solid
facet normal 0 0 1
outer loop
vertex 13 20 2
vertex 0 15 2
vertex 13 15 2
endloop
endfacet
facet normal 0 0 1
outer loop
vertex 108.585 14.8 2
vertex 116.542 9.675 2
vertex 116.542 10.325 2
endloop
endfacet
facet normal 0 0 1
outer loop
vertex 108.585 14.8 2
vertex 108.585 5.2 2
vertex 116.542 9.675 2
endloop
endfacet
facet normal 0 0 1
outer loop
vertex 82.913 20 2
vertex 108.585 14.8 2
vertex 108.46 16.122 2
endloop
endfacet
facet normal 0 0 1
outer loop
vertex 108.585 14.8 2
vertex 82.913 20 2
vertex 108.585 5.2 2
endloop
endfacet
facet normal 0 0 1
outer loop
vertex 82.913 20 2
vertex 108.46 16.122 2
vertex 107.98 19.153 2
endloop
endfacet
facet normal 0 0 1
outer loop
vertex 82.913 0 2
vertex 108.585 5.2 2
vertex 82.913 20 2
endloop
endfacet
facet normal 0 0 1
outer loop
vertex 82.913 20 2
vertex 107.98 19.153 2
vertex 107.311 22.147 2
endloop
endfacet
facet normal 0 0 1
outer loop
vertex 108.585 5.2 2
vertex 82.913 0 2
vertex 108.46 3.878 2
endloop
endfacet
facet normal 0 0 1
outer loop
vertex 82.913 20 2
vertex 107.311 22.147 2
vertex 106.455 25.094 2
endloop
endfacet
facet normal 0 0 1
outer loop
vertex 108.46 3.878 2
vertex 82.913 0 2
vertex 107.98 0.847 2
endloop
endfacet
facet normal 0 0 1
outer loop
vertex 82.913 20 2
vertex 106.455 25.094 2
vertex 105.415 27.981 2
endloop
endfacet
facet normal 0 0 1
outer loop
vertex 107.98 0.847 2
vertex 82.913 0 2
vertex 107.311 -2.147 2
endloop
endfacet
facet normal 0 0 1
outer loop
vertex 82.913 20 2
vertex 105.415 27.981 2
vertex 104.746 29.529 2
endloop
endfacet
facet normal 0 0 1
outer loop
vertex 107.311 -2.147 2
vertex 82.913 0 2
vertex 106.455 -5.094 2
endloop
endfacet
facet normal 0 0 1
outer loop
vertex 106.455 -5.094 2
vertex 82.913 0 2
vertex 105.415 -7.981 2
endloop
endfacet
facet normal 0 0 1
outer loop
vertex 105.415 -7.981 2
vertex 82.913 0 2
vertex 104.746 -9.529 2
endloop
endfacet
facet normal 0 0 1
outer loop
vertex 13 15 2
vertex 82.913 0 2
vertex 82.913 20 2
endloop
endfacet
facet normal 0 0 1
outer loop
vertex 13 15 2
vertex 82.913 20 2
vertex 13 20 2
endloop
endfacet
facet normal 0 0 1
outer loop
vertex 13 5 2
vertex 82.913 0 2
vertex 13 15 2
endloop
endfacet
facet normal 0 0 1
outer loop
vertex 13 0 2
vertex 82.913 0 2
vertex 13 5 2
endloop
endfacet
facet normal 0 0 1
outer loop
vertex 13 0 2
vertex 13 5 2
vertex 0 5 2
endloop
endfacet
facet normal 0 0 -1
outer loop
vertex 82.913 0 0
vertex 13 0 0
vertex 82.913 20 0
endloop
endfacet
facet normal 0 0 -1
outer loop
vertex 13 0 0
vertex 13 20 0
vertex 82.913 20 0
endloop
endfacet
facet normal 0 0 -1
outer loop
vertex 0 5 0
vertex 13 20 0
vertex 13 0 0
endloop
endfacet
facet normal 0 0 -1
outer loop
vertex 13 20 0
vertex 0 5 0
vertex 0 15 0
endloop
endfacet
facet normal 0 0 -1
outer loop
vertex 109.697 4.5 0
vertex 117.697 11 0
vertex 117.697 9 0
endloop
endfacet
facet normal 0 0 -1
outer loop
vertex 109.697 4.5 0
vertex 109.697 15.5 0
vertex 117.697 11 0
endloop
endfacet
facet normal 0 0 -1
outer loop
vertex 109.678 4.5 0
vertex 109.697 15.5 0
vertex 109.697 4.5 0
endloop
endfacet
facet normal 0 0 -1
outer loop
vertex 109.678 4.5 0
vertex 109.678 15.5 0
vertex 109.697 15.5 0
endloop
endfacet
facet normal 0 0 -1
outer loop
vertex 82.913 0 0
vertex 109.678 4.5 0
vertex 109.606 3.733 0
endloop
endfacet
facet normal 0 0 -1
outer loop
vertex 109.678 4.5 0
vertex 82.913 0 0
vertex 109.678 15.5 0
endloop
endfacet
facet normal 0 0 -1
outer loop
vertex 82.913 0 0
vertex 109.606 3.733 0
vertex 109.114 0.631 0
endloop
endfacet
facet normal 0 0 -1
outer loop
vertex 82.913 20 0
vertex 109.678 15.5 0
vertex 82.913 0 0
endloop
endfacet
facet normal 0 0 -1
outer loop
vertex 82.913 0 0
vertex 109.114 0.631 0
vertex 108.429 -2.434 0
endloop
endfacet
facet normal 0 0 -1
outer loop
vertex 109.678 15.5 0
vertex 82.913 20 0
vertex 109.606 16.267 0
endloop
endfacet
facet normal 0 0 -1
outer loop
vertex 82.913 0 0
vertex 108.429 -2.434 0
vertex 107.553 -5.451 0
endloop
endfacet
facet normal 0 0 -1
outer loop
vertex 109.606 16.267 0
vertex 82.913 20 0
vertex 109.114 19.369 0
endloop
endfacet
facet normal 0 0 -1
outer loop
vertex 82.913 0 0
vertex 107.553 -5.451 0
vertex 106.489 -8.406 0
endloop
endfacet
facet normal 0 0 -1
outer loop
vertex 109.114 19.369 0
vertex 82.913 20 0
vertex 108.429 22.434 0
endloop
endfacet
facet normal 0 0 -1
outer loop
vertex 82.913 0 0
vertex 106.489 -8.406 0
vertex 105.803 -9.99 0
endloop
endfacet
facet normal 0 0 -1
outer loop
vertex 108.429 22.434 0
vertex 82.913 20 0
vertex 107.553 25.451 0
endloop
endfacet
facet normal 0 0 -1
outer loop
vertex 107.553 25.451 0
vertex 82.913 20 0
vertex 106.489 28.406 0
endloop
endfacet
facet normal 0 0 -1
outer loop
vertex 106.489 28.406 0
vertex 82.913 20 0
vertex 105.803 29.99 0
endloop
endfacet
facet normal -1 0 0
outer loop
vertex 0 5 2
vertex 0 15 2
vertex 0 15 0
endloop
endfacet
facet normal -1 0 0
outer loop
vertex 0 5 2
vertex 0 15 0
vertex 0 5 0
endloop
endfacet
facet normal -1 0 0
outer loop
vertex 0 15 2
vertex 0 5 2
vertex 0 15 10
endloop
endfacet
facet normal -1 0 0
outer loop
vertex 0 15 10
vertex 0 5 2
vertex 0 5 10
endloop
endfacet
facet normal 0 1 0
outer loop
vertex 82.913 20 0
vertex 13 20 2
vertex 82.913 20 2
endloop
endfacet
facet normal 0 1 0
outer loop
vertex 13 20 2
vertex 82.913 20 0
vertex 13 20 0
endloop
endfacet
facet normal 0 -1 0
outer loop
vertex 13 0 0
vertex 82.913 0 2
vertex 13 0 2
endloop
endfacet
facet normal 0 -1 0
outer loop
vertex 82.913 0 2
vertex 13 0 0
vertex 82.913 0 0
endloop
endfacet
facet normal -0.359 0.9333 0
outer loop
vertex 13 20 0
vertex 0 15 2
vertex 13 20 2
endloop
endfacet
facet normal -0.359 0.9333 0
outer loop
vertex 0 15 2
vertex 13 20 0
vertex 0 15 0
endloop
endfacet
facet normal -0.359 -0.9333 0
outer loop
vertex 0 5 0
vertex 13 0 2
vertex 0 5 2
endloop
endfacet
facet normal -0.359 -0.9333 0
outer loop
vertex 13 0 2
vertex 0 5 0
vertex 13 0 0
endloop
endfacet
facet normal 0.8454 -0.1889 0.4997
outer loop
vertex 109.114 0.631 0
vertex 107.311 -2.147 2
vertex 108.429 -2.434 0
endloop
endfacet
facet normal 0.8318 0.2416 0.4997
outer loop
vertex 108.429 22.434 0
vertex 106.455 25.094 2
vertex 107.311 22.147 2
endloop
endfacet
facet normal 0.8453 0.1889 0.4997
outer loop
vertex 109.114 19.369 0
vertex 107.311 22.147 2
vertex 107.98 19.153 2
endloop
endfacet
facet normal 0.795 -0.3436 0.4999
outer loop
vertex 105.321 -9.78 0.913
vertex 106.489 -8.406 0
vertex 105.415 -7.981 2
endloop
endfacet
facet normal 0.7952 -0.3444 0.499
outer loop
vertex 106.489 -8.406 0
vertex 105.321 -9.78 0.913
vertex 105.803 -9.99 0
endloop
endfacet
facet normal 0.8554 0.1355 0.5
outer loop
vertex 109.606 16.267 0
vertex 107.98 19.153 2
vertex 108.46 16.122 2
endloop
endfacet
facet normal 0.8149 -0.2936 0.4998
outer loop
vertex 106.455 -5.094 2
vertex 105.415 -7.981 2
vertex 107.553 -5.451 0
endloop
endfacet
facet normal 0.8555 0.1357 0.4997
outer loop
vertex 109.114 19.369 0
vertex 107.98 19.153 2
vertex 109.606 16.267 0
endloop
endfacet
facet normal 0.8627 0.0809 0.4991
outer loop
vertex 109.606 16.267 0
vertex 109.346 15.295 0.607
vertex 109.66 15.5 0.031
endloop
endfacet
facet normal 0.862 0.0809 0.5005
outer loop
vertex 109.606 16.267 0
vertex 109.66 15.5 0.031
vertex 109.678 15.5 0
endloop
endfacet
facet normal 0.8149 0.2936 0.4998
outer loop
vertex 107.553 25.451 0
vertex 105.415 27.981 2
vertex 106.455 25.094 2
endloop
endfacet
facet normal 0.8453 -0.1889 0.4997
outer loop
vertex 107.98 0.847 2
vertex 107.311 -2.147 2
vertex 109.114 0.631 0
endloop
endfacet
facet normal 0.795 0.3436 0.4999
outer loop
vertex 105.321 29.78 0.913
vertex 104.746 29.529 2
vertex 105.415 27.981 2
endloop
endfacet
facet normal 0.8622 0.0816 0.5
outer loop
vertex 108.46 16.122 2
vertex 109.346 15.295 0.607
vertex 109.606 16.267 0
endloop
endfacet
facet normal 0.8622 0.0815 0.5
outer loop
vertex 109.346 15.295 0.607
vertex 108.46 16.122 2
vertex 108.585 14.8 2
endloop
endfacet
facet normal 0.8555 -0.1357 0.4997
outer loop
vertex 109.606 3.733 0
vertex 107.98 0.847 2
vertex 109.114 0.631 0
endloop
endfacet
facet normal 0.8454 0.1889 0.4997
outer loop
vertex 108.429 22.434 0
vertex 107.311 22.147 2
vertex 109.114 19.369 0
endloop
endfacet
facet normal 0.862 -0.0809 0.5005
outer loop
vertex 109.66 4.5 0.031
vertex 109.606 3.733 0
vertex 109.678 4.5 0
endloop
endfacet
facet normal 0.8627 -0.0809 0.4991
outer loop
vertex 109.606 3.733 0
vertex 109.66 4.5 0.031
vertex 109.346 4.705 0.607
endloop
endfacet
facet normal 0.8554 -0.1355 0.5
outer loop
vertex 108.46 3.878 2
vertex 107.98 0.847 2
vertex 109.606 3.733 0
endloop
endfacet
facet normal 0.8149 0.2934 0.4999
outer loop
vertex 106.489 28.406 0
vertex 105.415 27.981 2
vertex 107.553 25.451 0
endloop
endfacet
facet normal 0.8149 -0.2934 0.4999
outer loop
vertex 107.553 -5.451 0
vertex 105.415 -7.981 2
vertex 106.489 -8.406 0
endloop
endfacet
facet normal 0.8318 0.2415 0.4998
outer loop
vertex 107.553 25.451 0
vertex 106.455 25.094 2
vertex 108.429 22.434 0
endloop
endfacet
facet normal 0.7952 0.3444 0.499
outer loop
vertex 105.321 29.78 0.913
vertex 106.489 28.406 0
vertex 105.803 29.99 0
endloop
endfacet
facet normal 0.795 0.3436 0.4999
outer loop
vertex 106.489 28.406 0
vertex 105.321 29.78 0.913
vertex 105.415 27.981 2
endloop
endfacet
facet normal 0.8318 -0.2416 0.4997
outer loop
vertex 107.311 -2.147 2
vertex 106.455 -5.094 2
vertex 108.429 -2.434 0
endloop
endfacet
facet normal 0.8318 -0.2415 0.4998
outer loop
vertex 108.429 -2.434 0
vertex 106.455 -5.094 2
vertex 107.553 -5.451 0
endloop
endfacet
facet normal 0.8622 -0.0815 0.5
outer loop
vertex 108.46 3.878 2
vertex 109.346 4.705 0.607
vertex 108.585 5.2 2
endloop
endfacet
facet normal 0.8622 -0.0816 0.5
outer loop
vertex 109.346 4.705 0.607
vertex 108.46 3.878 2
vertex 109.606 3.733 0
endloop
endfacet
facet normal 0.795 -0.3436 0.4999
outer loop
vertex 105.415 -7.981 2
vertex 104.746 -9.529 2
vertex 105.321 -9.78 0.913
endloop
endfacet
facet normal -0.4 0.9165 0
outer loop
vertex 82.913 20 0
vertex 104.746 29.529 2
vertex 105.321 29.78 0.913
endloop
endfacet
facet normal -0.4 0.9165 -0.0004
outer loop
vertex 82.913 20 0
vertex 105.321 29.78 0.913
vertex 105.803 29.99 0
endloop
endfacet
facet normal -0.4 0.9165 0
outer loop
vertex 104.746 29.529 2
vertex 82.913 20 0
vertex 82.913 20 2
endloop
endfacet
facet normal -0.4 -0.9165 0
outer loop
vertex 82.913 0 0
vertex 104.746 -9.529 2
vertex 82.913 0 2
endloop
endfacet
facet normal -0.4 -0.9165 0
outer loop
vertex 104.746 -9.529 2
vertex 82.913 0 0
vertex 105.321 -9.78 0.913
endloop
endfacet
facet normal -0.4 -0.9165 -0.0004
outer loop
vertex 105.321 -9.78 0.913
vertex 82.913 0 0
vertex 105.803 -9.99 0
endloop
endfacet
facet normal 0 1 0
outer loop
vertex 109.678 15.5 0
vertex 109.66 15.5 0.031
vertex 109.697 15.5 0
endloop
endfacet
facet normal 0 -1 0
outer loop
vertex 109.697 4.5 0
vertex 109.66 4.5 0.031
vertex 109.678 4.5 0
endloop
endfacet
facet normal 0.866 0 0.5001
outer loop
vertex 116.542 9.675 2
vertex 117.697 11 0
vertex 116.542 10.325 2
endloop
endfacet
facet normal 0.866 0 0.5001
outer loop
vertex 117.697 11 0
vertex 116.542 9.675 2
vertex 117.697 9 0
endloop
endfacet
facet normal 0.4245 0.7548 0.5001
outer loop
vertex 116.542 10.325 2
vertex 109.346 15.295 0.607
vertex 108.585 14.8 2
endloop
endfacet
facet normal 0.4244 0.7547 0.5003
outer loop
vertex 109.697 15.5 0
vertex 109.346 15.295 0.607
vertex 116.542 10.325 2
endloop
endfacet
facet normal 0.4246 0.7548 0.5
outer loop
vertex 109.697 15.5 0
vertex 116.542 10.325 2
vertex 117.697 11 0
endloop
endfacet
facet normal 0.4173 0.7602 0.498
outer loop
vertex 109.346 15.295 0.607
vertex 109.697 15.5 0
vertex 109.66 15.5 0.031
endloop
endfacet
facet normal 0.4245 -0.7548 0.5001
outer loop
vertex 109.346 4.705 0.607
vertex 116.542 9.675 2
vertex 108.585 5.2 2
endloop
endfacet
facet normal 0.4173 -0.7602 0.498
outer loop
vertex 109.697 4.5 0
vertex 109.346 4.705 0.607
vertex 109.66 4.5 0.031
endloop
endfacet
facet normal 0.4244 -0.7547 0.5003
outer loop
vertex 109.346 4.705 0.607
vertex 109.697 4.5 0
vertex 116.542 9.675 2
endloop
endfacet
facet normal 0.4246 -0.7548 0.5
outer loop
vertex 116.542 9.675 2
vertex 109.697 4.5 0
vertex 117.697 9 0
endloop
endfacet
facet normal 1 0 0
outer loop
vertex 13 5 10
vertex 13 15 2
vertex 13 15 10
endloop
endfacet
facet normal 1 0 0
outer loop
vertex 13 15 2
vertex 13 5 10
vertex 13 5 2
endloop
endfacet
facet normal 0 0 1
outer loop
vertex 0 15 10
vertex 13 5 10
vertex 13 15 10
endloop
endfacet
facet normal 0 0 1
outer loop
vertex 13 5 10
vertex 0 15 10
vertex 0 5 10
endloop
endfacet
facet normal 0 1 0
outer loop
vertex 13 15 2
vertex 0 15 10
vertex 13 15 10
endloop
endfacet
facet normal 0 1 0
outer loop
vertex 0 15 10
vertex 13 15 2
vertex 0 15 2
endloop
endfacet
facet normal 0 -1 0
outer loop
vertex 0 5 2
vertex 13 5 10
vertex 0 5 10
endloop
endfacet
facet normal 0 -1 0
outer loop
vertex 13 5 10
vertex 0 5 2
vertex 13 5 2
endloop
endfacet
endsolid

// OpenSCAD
$fn = 100;

A = 2;
B = 11;
C = 40;
D = 8;
E = 50;
F = 2;
G = 10;
H = 13;
J = 60;
K = 10;
L = 60;
N = 20;

difference() {
    cube([J,N,F]);
    translate([0,(N/2)+(G/2),0]) rotate([0,0,atan(((N/2)-(G/2))/H)]) cube([10000,10000,10000]);
    translate([0,(G/2),0]) rotate([0,0,270-atan(((N/2)-(G/2))/H)]) cube([10000,10000,10000]);
}

translate([0,(N/2)-(G/2),0]) cube([H,G,K]);

translate([J,N/2,0]) difference() {
    cylinder(r1=E,r2=E-(tan(90-L)*F),h=F);
    rotate([0,0,asin((C/2)/E)]) cube([10000,10000,10000]);
    rotate([0,0,270-asin((C/2)/E)]) cube([10000,10000,10000]);
    translate([-10000,-5000,0]) cube([10000,10000,10000]);
}

translate([J,0,0]) cube([(N/2)/tan(asin((C/2)/E)),N,F]);

translate([-(E-(E*sin(acos((B/2)/E)))),0,0]) translate([J,(N/2)-(B/2),0]) difference() {
    cube([E+D,B,F]);
    translate([E+D,0,0]) rotate([0,-(90-L),0]) translate([0,0,-5000]) cube([10000,10000,10000]);
    translate([E+D,(B/2)+(A/2),0]) rotate([0,-(90-L),90-(atan(((B/2)-(A/2))/D))]) translate([0,0,-5000]) cube([10000,10000,10000]);
    translate([E+D,(B/2)-(A/2),0]) rotate([90,-(90-L),-(90-(atan(((B/2)-(A/2))/D)))]) translate([0,-5000,-5000]) cube([10000,10000,10000]);
}
